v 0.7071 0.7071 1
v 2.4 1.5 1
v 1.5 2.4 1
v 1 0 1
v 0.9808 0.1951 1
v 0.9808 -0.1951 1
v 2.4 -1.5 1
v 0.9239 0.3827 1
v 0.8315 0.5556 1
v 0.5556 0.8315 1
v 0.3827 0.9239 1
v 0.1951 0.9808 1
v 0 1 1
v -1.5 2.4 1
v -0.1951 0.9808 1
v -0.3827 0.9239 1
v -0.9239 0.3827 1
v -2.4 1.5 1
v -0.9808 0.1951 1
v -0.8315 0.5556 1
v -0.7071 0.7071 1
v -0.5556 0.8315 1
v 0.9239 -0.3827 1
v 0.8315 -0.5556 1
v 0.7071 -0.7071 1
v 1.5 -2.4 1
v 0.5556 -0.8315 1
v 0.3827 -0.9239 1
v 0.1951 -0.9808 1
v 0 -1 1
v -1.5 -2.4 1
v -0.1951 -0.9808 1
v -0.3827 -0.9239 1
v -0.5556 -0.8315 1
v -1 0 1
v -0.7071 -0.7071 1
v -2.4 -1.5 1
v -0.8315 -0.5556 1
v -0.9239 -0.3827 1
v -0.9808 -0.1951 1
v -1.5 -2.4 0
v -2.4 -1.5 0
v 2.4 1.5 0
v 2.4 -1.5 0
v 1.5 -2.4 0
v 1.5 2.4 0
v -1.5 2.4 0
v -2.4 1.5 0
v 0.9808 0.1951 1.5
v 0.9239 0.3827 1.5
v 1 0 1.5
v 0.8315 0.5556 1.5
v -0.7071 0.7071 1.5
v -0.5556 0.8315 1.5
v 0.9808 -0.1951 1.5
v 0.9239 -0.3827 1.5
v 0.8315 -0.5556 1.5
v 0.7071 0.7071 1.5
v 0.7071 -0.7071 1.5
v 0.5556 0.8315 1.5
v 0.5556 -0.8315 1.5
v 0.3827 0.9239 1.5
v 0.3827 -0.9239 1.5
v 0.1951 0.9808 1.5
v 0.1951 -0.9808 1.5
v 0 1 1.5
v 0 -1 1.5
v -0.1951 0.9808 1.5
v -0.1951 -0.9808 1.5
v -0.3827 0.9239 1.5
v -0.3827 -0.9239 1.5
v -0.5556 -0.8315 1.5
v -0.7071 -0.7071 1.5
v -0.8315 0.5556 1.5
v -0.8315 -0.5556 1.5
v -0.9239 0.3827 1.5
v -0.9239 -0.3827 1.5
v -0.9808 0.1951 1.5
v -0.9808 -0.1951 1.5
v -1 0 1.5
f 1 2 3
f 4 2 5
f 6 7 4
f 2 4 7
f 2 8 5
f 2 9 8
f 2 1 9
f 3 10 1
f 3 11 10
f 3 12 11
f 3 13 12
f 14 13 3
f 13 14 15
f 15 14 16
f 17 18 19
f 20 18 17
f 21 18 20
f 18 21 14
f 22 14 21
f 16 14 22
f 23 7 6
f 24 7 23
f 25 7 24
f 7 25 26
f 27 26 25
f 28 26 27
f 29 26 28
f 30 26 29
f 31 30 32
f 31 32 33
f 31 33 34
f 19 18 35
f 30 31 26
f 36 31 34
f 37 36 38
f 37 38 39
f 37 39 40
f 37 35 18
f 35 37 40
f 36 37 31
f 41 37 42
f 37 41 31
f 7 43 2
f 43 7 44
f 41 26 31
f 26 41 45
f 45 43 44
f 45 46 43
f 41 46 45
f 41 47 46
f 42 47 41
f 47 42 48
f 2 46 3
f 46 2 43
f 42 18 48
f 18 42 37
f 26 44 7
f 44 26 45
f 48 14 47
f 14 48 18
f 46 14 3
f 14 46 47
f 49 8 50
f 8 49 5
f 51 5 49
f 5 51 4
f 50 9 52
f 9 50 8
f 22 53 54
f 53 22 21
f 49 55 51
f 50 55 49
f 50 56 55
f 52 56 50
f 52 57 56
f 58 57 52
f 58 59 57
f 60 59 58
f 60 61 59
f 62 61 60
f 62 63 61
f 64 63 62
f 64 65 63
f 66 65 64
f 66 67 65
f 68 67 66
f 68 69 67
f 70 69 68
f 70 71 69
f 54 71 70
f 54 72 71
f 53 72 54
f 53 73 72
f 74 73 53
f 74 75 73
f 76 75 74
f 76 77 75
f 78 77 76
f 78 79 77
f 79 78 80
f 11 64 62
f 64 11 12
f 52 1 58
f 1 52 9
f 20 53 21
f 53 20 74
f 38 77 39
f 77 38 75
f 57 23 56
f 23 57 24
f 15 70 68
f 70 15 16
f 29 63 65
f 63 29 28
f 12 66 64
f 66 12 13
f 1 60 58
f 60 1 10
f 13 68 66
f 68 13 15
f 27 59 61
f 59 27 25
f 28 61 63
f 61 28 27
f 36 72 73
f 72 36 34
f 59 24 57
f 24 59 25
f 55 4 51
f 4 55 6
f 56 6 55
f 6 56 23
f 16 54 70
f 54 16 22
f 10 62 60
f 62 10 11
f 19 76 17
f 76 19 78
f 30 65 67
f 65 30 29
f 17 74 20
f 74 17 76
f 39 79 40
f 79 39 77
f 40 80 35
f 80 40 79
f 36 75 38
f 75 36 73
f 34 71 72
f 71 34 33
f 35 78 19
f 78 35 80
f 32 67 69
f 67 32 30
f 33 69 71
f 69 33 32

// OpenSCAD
/**
* Martin Egli
* 2024-05-29
* electronic parts
*/
module origin(col = "Red", len = 10, loc_res = 4) {
    color(col)
    cylinder(d2 = .8, d1 = 0, h = len, $fn = loc_res);
}

module buttonPTS526(col = "Silver", loc_res = 32) {
// origin in the middle, at the bottom
    color(col) {
        hull() {
            translate([-3/2, -4.8/2, 0])
            cube([3, 4.8, 1]);
            translate([-4.8/2, -3/2, 0])
            cube([4.8, 3, 1]);
        }
        translate([0, 0, 0])
        cylinder(d =2, h = 1.5, $fn = loc_res);
    }
}
buttonPTS526();
